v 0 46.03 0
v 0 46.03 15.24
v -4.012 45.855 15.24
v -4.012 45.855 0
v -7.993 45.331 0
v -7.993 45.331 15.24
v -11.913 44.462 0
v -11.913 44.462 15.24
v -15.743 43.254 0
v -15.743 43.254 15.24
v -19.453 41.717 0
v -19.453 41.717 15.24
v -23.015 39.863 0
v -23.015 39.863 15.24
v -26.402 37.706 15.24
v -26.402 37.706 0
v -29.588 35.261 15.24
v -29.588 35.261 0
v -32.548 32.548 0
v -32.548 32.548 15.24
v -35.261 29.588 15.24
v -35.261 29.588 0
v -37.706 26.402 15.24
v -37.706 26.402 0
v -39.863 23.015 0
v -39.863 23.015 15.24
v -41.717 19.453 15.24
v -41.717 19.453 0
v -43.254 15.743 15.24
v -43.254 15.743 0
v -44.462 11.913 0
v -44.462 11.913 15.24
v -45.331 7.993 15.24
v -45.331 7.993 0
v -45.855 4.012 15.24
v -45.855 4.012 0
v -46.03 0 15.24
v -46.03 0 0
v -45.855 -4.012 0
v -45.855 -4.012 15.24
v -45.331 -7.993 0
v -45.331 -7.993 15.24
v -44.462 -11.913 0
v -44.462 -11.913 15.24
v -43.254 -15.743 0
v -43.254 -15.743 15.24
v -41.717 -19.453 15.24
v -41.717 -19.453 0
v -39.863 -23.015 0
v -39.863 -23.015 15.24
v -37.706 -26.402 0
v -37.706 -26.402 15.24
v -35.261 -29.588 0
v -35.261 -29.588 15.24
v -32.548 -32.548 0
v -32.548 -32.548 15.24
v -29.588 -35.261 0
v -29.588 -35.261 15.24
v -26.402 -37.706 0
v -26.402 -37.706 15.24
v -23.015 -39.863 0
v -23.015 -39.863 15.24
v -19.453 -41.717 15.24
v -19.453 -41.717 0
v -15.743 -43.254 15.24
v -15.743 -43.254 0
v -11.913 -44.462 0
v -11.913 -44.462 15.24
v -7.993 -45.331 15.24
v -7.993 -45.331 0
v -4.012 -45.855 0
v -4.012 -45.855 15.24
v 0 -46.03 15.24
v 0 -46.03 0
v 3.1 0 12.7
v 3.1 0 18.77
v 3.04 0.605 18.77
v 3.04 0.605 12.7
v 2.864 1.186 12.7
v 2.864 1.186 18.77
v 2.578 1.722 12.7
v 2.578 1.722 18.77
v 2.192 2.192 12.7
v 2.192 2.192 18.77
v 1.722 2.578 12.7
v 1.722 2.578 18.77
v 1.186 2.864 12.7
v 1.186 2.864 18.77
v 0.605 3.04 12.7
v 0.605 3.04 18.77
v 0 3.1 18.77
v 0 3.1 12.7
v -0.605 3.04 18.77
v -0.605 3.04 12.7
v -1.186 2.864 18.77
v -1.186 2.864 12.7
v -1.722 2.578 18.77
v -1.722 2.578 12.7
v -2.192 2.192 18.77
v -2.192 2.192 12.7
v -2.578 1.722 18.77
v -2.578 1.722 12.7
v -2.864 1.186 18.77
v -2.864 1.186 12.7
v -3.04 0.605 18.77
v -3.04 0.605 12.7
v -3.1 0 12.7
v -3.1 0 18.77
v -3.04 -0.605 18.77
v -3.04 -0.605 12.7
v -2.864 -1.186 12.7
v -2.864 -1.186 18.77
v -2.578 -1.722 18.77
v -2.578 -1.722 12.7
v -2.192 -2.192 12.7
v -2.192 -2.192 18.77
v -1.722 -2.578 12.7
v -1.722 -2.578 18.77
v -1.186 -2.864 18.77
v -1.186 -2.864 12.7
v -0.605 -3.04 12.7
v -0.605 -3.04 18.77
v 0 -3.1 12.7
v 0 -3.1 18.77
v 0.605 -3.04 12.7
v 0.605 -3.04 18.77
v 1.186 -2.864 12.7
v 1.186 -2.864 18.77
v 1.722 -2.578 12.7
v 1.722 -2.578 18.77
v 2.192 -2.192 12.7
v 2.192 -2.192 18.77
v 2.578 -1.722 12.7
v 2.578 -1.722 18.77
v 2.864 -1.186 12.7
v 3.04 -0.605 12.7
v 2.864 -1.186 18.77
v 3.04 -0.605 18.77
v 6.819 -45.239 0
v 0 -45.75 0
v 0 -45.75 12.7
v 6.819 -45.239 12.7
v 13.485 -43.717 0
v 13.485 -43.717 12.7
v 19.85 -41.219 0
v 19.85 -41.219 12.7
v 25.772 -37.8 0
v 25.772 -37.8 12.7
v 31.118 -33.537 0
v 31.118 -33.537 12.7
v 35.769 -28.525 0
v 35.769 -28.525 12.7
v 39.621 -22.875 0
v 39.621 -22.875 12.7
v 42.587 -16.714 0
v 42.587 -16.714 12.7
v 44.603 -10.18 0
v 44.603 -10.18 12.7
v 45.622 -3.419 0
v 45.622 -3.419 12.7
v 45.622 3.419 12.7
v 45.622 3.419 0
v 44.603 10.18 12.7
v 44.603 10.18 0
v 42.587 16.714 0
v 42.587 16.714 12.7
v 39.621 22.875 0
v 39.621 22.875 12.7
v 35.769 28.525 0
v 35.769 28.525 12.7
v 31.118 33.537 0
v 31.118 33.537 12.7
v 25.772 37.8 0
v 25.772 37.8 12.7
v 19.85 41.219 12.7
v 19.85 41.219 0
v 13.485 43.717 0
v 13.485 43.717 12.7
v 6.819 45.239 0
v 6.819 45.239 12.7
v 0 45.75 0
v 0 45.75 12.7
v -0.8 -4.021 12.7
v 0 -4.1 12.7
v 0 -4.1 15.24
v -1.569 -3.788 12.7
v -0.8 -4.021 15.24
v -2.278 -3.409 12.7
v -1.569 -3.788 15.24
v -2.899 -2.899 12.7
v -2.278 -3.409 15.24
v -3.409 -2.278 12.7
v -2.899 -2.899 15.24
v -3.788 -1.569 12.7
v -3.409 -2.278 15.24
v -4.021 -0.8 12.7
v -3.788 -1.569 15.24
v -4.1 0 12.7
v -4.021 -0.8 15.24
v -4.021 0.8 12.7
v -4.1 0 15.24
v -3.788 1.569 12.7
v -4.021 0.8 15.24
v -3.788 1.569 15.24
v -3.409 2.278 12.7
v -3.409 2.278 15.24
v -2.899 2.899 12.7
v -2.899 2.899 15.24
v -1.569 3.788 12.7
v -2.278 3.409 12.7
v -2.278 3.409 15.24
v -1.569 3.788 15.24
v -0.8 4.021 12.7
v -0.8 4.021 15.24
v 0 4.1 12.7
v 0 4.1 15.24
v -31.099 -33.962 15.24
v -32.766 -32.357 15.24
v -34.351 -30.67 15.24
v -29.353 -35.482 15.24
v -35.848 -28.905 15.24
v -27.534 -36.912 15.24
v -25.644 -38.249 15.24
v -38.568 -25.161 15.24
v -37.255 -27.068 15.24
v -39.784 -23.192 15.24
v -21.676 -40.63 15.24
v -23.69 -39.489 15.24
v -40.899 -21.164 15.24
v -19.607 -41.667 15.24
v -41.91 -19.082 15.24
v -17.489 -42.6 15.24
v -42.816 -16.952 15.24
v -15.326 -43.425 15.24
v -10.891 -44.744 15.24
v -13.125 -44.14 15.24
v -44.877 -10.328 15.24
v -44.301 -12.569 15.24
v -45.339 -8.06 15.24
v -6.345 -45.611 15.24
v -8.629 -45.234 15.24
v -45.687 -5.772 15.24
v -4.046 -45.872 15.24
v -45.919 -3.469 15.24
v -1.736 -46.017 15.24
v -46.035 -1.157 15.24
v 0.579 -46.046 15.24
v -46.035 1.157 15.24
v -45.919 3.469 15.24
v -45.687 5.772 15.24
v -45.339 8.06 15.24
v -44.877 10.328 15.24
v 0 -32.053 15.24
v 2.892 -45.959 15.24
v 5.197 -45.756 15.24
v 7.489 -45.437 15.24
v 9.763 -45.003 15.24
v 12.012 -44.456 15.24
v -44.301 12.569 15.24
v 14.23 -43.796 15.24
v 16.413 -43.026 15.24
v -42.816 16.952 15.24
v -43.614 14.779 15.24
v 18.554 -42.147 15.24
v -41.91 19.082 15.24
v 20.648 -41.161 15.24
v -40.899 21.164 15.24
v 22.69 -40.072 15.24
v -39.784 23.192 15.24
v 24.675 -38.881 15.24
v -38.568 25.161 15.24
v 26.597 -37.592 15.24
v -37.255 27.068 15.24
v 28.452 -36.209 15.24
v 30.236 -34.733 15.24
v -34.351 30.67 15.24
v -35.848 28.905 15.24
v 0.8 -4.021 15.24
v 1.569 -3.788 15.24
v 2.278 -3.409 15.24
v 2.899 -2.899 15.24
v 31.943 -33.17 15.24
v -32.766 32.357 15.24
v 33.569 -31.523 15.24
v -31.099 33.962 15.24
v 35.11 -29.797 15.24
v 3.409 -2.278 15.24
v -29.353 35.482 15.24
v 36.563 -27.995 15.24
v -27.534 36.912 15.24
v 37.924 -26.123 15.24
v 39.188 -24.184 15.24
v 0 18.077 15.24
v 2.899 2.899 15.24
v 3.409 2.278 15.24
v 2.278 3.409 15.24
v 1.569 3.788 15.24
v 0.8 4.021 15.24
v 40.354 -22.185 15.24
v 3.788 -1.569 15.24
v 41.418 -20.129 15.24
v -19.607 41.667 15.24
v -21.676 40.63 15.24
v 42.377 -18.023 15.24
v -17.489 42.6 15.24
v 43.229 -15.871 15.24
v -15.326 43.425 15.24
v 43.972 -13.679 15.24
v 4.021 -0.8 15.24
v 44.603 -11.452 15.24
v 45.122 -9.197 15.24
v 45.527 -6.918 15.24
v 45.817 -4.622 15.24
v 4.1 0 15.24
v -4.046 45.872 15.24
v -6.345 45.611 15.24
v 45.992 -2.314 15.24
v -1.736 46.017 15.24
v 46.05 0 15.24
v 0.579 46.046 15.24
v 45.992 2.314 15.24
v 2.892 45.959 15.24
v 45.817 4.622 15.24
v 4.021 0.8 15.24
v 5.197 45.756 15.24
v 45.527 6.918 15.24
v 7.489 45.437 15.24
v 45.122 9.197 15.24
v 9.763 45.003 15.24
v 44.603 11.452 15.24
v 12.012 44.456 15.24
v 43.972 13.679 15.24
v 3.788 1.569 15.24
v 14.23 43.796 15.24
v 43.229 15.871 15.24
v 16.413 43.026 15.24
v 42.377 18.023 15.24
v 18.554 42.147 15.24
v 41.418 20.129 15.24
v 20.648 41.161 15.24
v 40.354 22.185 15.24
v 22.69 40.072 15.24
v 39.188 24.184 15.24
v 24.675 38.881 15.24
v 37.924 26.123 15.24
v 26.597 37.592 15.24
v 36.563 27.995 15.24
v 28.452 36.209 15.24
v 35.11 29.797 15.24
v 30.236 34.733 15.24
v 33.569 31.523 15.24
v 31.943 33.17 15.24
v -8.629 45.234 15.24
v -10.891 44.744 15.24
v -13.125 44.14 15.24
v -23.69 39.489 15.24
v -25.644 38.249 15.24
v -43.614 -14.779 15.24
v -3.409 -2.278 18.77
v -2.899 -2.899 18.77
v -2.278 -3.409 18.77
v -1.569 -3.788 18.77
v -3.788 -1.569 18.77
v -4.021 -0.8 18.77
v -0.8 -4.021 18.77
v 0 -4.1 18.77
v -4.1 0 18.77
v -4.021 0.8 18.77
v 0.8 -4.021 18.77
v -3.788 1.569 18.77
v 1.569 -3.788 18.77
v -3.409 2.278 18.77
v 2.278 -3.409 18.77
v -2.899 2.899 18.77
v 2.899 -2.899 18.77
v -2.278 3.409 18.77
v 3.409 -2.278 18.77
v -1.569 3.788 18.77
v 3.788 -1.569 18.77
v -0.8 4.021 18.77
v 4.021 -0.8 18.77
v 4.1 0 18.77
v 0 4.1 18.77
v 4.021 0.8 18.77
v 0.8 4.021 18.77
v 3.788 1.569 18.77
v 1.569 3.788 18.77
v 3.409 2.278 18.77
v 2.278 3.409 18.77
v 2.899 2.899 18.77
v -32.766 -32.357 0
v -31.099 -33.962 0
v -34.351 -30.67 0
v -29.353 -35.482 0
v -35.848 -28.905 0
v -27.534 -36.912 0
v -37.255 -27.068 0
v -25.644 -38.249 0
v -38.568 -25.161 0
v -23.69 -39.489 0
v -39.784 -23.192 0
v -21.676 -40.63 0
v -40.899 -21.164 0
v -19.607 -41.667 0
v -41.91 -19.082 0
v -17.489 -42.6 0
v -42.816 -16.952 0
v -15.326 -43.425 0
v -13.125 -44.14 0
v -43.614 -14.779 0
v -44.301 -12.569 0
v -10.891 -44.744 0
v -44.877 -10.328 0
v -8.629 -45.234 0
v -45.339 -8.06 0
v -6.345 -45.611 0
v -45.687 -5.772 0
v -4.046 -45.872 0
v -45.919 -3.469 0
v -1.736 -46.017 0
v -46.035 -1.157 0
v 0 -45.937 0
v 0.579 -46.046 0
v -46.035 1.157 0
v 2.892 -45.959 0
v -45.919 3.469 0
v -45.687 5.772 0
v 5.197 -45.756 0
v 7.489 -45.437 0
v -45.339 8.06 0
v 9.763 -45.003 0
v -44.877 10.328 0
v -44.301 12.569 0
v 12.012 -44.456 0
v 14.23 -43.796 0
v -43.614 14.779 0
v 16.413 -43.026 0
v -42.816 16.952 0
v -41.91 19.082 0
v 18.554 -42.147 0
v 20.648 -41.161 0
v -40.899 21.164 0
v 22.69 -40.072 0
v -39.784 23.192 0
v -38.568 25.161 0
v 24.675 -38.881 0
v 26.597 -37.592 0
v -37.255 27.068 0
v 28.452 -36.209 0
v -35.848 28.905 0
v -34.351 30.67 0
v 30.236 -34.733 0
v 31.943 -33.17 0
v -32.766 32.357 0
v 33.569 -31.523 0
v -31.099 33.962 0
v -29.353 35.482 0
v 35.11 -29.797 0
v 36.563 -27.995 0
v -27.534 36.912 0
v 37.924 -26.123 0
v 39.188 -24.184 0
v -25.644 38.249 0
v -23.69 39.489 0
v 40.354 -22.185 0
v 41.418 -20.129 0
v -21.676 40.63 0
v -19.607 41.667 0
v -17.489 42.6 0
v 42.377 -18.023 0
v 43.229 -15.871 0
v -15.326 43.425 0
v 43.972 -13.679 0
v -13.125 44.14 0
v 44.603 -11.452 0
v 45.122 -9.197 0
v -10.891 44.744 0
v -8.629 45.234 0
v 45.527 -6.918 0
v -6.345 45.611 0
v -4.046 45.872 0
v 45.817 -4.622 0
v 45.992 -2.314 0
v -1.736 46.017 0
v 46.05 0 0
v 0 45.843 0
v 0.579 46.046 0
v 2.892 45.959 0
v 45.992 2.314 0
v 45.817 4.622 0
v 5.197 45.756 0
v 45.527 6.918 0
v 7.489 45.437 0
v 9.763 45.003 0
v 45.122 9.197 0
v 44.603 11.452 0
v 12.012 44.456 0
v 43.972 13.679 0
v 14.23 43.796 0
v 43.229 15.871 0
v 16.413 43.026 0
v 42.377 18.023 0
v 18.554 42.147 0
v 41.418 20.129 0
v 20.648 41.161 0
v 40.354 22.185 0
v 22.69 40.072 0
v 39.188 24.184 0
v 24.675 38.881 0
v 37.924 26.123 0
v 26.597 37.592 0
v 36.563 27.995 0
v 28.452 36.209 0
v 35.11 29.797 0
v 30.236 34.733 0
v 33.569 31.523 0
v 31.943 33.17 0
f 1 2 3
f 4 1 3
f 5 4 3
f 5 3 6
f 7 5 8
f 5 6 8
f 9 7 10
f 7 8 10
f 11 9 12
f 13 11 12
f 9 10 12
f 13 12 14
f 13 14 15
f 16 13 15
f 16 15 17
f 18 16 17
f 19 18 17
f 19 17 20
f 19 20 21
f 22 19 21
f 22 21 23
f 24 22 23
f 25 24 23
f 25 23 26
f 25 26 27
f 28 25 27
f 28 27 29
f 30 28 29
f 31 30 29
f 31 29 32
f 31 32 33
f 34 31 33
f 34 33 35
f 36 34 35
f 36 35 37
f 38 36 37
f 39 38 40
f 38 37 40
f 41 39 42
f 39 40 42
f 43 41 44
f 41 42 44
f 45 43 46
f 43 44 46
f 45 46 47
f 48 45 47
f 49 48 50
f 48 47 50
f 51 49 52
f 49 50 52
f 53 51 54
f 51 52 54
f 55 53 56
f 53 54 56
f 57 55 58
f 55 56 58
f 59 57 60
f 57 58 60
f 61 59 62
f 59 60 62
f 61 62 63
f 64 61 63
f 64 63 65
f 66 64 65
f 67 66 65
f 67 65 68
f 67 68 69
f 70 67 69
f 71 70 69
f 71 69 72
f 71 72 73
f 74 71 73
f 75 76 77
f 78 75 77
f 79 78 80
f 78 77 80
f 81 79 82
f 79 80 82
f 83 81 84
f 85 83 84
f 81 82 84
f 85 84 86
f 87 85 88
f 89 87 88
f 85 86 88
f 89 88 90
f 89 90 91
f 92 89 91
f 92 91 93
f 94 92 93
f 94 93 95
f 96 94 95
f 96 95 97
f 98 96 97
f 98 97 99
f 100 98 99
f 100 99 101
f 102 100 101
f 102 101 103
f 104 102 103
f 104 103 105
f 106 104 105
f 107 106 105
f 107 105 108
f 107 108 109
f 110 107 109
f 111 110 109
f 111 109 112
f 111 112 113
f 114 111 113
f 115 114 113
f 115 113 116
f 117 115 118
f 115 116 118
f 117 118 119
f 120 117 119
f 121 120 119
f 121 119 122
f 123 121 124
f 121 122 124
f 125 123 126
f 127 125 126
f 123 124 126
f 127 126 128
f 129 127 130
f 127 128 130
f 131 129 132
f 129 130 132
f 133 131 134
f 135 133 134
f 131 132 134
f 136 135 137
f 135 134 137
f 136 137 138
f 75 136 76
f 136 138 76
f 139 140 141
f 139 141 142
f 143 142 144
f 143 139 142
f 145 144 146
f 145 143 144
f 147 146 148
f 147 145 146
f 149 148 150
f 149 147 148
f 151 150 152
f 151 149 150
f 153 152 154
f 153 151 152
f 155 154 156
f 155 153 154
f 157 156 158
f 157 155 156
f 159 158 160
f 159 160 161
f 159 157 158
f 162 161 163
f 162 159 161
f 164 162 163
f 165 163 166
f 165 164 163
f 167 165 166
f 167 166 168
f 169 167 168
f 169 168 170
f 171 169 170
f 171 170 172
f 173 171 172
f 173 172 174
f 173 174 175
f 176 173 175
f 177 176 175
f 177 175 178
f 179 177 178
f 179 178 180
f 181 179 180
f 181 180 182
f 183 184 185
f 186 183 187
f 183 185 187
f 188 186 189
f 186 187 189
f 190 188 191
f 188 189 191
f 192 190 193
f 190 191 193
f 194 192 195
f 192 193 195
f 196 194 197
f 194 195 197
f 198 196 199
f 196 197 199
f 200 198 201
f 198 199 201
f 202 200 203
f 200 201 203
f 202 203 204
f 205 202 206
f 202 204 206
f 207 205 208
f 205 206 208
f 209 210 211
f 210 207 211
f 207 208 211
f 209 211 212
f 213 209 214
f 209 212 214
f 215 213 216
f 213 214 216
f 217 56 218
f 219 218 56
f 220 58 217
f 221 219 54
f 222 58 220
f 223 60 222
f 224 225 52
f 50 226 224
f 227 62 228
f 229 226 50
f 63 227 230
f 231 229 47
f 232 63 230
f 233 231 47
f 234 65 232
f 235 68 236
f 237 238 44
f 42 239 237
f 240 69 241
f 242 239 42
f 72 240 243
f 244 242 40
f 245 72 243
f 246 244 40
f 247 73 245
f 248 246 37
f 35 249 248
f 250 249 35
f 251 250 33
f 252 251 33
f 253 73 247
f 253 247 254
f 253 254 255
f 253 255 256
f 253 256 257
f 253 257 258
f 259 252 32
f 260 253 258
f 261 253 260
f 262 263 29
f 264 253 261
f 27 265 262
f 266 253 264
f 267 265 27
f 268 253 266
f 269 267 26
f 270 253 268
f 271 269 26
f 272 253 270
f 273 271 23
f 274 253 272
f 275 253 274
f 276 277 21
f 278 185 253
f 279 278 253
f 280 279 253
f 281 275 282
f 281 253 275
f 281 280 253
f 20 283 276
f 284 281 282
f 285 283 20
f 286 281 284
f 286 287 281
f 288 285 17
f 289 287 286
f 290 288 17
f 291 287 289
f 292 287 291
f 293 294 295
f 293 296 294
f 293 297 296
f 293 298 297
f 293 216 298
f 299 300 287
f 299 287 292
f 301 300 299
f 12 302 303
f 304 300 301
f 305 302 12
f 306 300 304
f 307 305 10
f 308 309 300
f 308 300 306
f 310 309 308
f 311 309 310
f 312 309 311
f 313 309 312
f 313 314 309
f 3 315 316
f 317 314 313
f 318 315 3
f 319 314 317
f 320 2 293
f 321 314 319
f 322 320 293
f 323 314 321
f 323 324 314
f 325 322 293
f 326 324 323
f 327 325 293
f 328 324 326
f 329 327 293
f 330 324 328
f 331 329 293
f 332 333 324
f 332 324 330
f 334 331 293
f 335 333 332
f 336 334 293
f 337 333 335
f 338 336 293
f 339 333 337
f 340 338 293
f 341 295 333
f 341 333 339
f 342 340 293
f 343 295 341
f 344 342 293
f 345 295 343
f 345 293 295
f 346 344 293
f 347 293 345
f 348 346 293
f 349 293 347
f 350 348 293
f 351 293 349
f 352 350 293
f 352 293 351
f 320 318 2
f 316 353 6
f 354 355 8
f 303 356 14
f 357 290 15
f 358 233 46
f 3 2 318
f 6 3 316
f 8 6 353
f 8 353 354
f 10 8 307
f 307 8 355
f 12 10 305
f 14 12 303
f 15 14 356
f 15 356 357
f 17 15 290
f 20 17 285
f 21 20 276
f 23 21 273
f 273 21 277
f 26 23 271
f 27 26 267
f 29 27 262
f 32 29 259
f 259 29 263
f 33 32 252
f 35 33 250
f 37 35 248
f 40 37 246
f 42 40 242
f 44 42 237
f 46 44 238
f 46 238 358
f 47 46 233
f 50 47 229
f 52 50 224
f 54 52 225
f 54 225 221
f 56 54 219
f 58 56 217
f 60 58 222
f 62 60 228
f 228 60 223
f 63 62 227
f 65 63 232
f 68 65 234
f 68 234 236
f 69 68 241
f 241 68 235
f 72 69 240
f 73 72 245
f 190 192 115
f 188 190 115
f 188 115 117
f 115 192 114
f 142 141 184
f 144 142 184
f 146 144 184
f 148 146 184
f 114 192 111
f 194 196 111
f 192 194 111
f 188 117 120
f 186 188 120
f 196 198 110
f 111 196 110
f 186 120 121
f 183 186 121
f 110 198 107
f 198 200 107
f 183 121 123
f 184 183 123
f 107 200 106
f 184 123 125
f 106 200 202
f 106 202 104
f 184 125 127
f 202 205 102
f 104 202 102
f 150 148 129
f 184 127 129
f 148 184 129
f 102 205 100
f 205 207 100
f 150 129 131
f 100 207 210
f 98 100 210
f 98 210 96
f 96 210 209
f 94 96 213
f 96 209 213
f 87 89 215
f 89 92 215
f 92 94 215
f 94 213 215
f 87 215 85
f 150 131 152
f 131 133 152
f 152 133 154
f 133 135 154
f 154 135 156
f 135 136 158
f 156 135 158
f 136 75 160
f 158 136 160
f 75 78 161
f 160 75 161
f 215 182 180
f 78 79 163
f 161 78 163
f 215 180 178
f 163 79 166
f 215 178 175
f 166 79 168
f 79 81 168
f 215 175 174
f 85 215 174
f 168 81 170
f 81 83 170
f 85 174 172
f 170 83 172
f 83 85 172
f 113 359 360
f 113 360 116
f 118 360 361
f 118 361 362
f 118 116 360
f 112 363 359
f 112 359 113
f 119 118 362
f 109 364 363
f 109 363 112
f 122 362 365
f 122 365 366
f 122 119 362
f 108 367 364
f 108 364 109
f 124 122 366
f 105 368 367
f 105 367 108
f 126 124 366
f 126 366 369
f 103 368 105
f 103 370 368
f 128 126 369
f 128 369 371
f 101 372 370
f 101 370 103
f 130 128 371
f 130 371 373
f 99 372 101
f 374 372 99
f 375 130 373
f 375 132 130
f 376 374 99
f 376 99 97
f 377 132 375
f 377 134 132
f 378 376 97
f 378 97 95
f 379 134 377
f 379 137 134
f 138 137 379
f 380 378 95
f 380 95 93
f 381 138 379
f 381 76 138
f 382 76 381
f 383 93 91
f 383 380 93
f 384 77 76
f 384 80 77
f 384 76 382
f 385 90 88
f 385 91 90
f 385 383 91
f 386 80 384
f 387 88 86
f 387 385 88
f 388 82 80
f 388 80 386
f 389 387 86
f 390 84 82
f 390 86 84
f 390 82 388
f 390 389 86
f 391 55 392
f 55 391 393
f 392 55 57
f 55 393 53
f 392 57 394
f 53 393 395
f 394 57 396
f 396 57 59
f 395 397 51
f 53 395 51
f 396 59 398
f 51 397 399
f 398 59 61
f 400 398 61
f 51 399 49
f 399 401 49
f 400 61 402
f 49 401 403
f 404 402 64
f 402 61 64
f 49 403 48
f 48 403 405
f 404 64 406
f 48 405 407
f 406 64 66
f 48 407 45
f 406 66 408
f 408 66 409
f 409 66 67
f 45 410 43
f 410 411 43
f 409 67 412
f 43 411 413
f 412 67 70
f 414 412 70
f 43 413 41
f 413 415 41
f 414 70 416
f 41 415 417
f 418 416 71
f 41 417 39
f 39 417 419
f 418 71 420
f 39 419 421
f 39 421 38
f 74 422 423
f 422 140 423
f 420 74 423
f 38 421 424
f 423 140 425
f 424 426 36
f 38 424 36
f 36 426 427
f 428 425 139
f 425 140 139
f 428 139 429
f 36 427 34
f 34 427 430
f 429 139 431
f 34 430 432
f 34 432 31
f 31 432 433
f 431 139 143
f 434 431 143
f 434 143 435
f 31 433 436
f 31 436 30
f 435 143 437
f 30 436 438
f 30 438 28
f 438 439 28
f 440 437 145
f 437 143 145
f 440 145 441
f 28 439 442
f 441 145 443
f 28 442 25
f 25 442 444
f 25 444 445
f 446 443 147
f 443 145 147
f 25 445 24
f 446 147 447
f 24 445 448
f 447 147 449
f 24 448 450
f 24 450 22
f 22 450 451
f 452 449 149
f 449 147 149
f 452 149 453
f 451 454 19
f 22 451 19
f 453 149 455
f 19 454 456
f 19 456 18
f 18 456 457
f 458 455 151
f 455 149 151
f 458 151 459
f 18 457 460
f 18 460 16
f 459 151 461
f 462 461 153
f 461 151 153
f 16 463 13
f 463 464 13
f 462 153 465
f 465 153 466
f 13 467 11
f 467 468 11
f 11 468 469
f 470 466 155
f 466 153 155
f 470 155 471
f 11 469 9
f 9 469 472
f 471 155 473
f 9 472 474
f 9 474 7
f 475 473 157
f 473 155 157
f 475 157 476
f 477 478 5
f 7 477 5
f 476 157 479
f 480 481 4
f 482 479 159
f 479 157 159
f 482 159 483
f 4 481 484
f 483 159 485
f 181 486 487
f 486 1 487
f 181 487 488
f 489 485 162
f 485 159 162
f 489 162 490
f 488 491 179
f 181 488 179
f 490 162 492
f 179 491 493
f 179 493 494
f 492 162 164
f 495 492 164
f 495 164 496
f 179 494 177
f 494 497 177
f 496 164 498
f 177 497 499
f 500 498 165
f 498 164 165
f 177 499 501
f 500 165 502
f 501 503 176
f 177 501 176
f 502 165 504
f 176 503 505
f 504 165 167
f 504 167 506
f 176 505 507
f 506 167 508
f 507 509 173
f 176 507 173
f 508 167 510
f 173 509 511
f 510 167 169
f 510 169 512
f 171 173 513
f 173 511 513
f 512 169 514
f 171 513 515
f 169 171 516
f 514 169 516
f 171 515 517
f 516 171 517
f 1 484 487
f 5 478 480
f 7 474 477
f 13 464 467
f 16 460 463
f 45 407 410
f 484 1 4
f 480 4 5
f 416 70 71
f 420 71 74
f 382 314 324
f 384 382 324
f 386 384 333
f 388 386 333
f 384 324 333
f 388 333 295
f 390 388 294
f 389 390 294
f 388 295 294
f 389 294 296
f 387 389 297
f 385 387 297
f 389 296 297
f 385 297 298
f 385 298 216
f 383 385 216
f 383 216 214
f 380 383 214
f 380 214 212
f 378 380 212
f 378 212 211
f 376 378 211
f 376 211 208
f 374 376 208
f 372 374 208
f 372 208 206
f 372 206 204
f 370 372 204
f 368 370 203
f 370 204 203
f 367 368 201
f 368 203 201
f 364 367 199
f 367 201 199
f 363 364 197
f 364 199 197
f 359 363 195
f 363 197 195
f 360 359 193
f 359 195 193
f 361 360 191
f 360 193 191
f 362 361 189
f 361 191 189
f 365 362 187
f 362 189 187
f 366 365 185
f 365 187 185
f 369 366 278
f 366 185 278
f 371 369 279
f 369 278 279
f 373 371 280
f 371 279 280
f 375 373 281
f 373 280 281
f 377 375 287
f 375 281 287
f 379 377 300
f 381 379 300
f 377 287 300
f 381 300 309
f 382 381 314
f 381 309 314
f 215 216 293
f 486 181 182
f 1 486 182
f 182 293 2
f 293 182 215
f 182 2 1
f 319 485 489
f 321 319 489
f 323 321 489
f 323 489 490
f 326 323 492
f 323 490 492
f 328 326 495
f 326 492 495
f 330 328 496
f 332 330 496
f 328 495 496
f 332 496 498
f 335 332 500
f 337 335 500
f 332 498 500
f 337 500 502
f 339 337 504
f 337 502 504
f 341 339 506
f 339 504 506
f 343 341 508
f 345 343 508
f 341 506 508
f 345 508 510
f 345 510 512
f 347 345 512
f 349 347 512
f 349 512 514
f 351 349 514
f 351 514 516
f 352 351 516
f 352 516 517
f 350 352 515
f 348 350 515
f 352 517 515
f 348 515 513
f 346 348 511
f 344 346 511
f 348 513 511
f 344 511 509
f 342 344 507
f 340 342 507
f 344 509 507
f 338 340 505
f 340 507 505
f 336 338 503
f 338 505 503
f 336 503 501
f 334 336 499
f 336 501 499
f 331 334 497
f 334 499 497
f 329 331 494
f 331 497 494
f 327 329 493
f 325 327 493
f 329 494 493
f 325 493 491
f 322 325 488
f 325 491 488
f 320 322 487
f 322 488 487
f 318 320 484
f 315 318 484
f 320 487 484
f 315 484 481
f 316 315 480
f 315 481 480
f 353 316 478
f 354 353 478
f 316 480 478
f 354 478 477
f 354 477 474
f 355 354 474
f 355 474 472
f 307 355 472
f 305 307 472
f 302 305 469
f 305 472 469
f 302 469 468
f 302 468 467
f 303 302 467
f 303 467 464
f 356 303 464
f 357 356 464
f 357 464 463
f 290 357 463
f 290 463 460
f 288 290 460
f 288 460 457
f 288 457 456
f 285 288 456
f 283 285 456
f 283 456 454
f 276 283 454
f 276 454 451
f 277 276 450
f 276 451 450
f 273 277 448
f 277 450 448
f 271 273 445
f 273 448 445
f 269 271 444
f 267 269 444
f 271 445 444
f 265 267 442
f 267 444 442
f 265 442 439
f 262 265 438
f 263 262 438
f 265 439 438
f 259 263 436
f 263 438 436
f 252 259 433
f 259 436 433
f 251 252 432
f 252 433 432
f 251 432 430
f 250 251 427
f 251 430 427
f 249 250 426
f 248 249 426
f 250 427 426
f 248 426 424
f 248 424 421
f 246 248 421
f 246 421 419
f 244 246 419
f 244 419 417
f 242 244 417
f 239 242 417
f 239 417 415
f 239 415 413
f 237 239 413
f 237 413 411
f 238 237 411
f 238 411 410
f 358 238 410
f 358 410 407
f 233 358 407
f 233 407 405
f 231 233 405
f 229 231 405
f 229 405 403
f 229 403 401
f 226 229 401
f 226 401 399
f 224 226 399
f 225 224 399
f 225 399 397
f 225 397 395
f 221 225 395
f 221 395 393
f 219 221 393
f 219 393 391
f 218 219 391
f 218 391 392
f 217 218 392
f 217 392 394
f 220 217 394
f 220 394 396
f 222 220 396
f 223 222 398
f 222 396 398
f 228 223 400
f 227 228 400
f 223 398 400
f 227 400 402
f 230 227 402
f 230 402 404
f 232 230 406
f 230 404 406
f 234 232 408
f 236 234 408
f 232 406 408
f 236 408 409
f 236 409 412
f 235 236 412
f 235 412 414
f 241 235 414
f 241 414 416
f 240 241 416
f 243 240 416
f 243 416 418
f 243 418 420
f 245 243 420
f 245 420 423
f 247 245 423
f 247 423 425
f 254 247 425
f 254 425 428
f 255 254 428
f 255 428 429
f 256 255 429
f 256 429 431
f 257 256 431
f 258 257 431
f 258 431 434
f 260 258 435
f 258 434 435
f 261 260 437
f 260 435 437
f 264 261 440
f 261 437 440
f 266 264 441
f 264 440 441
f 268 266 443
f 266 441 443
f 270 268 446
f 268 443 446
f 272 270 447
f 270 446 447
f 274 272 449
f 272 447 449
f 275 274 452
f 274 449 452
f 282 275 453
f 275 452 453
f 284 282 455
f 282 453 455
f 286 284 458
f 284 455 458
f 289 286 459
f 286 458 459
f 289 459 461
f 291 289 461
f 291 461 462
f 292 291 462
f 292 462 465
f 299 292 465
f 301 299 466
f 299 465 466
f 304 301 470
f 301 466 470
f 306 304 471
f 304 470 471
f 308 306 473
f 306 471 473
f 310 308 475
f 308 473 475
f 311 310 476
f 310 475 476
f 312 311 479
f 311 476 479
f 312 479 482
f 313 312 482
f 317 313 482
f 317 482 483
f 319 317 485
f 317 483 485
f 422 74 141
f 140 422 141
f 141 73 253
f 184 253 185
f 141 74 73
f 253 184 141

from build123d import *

# Parameters (mm, degrees)
F0_R          = 46.05
F1_DEPTH      = 15.24
F2_R          = 45.75
F3_DEPTH      = 12.7
F4_R          = 4.1
F5_DEPTH      = 3.53
F5_DEPTH_BACK = 1
F7_DEPTH      = 15.241
F8_R          = 3.1
F9_DEPTH      = 18.771


# Not quite as in the source:
# - after a boolean that leaves OpenCascade's solid faulty, fix() repairs it


with BuildPart() as f1:
    # F0 (on Top) → F1 (new body)
    with BuildSketch(Plane.XY):
        Circle(F0_R)
    extrude(amount=F1_DEPTH)

    # F2 (on Top) → F3 (cut)
    with BuildSketch(Plane.XY):
        Circle(F2_R)
    extrude(amount=F3_DEPTH, mode=Mode.SUBTRACT)

    # F4 (on face) → F5 (join, two sides)
    with BuildSketch(Plane.XY.offset(15.24)) as f5_sk:
        Circle(F4_R)
    extrude(amount=F5_DEPTH)
    extrude(f5_sk.sketch, amount=-F5_DEPTH_BACK)

    # F6 (on face) → F7 (cut, through all)
    with BuildSketch(Plane.XY.offset(15.24)):
        with BuildLine():
            Line((0, 4.1), (0, 46.03))
            ThreePointArc((0, 46.03), (-46.03, 0), (0, -46.03))
            Line((0, -46.03), (0, -4.1))
            ThreePointArc((0, -4.1), (-4.1, 0), (0, 4.1))
        make_face()
    extrude(amount=-F7_DEPTH, mode=Mode.SUBTRACT)

    add(f1.part.fix(), mode=Mode.REPLACE)

    # F8 (on face) → F9 (cut, through all)
    with BuildSketch(Plane.XY.offset(18.77)):
        Circle(F8_R)
    extrude(amount=-F9_DEPTH, mode=Mode.SUBTRACT)


solid = f1.part
